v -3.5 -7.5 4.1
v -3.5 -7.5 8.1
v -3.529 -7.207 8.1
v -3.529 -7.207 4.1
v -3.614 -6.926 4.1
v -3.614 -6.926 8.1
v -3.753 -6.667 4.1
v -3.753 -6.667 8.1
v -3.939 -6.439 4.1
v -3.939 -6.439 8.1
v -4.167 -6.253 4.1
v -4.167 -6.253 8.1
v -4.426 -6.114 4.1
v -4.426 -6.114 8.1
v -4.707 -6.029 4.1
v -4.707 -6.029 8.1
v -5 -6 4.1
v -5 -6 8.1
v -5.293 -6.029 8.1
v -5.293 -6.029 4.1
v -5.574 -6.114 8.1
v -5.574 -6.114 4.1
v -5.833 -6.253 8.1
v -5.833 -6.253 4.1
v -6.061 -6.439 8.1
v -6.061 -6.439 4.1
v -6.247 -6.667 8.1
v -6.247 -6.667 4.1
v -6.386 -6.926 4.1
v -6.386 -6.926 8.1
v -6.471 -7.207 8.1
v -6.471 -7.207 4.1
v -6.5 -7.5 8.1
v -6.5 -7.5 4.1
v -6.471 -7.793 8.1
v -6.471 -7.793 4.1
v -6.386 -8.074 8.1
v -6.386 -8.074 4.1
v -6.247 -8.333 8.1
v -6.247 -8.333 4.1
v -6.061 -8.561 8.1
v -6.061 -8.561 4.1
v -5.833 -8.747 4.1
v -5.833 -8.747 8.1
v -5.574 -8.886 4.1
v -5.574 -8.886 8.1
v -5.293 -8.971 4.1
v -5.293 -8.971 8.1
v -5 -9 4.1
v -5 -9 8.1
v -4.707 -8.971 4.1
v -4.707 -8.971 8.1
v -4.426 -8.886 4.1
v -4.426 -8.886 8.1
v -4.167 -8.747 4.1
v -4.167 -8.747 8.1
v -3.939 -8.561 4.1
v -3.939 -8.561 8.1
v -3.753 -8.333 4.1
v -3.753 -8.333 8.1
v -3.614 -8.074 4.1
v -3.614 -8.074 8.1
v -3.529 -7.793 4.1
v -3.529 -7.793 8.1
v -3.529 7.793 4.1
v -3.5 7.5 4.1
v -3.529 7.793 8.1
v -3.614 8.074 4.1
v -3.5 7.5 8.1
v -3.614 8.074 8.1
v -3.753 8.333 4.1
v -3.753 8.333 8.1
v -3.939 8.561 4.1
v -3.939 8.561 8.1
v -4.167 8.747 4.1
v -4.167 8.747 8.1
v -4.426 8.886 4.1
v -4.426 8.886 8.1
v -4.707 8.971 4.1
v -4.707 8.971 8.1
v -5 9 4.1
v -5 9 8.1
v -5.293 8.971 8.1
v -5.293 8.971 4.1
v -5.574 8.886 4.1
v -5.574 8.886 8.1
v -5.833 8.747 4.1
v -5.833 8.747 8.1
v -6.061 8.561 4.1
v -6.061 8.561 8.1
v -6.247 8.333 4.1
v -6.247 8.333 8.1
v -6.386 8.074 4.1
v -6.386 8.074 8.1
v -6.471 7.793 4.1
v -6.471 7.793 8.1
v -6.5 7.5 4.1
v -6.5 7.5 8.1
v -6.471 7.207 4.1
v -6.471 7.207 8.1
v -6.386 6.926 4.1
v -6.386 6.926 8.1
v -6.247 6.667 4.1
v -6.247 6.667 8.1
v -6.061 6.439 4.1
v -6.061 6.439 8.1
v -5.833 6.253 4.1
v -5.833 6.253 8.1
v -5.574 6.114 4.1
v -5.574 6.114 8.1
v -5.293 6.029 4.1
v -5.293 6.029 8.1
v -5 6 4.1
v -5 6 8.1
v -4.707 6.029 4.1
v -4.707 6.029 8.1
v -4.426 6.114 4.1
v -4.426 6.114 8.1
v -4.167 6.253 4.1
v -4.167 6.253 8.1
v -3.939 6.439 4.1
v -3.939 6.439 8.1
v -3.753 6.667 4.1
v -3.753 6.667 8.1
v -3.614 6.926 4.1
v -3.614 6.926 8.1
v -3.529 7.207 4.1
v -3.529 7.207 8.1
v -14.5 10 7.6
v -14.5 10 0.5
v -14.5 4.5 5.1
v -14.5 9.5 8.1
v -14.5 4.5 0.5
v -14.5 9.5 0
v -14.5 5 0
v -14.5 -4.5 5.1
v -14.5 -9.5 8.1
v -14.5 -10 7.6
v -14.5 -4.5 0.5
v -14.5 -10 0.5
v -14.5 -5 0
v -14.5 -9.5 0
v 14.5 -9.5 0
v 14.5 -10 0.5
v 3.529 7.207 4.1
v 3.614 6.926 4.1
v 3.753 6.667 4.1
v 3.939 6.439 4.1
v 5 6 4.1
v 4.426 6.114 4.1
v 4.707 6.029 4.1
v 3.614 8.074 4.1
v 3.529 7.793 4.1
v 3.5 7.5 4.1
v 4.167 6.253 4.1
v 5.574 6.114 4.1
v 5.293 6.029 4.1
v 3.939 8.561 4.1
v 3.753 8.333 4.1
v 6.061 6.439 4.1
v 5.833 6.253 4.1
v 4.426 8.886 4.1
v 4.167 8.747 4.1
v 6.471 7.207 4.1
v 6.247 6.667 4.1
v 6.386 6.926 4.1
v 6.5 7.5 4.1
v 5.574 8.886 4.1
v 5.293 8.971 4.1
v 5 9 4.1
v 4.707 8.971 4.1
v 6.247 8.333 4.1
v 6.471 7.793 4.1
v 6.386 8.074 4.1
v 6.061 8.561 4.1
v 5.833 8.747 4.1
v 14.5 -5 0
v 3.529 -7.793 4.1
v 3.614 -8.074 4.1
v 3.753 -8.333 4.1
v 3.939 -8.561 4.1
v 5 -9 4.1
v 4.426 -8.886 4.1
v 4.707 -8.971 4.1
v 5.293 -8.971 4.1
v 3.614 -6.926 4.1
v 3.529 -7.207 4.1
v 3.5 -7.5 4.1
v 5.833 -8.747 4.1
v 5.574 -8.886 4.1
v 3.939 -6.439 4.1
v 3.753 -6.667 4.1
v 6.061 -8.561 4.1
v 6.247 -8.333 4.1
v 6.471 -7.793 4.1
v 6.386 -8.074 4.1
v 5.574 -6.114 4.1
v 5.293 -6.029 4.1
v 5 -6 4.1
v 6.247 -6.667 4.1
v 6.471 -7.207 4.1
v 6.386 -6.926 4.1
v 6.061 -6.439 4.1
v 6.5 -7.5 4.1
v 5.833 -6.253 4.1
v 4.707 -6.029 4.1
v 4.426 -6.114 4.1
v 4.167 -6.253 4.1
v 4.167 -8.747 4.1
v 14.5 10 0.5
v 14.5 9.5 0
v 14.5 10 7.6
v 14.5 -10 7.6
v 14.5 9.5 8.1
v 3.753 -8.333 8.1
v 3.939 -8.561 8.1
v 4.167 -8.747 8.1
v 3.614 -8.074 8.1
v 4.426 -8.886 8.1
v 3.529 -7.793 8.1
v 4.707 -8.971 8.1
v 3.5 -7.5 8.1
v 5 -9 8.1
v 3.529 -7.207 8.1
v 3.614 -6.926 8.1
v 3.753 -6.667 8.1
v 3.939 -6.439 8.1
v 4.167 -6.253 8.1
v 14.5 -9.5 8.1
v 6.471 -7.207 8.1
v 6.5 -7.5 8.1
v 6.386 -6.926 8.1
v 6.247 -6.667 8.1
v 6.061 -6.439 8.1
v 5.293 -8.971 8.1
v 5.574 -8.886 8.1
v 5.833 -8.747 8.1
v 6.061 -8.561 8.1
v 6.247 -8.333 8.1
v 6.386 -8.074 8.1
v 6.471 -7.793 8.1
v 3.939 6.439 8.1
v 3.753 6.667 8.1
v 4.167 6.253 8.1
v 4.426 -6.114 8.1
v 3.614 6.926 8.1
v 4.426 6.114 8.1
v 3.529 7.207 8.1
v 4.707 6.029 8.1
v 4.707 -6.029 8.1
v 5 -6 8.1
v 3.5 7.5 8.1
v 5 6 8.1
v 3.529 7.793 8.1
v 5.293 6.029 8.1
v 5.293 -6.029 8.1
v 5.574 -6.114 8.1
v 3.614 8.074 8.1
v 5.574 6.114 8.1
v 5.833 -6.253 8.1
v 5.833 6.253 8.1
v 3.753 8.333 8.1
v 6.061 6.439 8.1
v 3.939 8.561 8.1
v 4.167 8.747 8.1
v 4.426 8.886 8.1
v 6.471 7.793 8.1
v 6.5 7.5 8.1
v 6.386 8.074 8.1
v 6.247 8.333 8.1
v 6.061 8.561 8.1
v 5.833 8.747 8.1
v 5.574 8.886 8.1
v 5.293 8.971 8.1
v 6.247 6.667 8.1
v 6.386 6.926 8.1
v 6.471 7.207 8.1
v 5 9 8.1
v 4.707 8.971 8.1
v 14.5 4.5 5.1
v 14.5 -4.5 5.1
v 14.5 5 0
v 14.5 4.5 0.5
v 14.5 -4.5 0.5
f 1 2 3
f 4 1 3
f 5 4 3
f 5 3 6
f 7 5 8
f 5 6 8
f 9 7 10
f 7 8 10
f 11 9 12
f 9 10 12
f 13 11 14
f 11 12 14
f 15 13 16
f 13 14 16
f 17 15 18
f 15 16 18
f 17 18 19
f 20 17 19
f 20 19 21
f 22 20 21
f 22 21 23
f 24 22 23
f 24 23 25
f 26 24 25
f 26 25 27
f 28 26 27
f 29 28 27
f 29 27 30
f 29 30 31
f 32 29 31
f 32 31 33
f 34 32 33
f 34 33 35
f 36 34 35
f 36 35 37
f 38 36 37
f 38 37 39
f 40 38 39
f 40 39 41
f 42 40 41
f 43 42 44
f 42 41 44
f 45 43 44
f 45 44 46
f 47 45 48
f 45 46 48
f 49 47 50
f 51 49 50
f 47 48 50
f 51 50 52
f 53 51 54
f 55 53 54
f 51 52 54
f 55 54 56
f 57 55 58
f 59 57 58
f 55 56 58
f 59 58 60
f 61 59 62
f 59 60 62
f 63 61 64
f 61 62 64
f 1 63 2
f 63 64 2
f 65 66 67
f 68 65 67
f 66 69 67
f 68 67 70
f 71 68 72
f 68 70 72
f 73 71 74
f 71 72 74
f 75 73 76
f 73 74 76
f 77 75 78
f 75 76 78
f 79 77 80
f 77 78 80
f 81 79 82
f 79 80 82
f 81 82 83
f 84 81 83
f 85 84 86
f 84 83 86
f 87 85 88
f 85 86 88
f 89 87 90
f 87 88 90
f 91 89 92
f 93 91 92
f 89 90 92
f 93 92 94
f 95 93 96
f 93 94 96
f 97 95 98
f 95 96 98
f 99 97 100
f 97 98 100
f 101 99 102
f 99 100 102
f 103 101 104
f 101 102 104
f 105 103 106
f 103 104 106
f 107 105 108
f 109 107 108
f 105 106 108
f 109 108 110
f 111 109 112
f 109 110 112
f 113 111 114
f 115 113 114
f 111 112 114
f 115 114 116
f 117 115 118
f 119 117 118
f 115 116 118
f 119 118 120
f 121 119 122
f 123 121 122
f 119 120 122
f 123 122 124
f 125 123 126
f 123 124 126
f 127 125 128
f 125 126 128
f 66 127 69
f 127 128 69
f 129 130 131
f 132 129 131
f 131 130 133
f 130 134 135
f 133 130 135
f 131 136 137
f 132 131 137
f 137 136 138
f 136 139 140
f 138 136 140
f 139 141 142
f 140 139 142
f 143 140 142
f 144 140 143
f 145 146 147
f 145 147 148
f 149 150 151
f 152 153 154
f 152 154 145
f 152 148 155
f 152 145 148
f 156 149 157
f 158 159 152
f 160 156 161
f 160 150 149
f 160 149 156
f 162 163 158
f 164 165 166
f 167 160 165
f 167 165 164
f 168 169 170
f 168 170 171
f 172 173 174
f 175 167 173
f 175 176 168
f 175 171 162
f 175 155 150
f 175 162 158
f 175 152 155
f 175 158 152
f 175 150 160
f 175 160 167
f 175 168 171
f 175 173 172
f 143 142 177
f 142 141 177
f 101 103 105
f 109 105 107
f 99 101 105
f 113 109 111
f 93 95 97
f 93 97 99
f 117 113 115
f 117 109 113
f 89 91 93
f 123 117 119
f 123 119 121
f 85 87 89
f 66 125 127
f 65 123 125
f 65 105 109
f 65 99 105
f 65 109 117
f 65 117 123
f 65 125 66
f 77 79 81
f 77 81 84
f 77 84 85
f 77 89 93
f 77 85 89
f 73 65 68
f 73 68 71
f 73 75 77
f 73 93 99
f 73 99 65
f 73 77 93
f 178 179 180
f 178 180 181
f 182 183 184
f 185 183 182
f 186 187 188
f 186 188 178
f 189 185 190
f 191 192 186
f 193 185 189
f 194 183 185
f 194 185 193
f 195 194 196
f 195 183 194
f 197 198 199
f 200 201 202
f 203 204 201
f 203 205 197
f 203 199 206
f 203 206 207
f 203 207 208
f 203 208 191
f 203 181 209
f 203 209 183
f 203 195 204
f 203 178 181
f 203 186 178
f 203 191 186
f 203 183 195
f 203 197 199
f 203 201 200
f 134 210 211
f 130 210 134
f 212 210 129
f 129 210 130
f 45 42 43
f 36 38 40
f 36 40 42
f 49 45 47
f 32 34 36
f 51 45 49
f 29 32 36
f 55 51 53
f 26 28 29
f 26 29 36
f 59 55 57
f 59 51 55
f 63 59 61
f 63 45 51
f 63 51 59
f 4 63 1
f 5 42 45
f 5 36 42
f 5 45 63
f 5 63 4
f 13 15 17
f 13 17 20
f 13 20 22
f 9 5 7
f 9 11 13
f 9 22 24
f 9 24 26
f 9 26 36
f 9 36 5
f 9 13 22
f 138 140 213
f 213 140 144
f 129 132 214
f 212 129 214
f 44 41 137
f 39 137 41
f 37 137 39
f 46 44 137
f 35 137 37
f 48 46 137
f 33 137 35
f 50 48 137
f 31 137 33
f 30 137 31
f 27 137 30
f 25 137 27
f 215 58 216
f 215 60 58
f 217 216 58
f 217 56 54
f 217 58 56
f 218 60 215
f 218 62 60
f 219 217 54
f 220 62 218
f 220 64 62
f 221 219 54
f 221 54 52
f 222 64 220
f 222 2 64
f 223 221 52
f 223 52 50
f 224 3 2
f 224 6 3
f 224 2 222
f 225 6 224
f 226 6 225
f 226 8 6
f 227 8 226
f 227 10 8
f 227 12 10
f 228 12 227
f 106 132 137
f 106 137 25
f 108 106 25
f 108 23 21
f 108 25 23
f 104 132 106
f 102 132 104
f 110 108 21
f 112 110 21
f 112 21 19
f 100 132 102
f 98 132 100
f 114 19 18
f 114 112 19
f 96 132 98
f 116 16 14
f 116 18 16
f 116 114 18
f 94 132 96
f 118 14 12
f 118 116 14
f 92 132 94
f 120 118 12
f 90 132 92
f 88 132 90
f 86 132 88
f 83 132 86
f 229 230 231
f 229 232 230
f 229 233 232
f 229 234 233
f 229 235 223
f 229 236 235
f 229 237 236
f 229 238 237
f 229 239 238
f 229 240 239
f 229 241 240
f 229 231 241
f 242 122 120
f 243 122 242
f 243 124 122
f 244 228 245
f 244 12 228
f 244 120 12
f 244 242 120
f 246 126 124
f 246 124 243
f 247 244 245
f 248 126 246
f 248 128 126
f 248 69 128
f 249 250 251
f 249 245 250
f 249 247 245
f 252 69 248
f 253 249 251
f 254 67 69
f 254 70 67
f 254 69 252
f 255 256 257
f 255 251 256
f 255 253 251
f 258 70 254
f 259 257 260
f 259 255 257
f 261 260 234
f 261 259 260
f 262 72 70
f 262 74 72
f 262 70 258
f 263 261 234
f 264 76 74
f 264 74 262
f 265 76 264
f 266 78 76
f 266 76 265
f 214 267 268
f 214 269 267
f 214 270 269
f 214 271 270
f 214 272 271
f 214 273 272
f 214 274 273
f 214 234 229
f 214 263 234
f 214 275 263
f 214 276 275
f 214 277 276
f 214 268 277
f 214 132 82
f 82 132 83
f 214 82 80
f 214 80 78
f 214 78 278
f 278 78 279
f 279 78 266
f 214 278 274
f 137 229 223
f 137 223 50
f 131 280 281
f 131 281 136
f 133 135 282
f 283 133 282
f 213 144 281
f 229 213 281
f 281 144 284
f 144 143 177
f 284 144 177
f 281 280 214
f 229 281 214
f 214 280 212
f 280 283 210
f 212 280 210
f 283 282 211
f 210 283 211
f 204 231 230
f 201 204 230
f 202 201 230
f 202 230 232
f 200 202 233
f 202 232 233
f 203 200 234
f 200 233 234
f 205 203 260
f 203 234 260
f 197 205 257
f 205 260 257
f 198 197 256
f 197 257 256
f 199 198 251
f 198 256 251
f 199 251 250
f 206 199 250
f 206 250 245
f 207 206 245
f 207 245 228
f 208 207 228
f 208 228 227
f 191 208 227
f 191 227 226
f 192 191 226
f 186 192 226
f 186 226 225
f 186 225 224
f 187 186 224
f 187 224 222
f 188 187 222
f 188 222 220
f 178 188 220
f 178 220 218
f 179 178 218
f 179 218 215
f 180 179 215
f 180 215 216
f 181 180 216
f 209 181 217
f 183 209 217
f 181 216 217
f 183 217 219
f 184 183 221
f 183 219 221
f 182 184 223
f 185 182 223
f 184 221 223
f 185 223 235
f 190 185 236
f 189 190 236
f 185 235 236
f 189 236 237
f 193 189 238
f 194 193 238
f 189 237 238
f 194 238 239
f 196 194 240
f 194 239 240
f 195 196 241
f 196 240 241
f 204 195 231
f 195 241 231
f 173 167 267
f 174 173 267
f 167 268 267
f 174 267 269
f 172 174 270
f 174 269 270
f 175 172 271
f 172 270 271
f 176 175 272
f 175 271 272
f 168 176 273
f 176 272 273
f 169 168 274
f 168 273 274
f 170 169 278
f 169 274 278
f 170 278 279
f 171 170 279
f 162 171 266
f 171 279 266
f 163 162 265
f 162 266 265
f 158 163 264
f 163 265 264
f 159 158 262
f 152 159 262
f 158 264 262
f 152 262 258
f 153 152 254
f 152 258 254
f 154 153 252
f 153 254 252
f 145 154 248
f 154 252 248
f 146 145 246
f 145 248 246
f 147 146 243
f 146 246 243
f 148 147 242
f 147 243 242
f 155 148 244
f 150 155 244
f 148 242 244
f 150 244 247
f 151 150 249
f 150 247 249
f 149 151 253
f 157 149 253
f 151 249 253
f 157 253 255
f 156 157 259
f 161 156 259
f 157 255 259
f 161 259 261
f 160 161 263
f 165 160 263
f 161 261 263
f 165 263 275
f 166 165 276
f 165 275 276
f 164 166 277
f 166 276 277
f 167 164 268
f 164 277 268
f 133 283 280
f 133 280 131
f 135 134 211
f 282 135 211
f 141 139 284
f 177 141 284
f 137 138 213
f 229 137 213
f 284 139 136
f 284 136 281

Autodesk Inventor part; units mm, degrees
ref_plane "YZ Plane" through (0, 0, 0) normal (1, 0, 0) x (0, 1, 0)
ref_plane "XZ Plane" through (0, 0, 0) normal (0, 1, 0) x (-1, 0, 0)
ref_plane "XY Plane" through (0, 0, 0) normal (0, 0, 1) x (1, 0, 0)
sketch "スケッチ1" plane through (0, 0, 0) normal (0, 0, 1) x (1, 0, 0)
  line L0 (14.5, 10) -> (-14.5, 10)
  line L1 (-14.5, 10) -> (-14.5, -10)
  line L2 (-14.5, -10) -> (14.5, -10)
  line L3 (14.5, -10) -> (14.5, 10)
  line L4 (14.5, 10) -> (-14.5, -10) construction
  line L5 (-14.5, 10) -> (14.5, -10) construction
  point P0 (0, 0)
  dimension "d0" = 29
  dimension "d1" = 20
extrude "押し出し1" add sketch "スケッチ1" along normal blind 8.1
sketch "スケッチ2" plane through (0, 0, 8.1) normal (0, 0, 1) x (1, 0, 0)
  circle A0 centre (-5, 7.5) radius 1.5
  circle A1 centre (5, 7.5) radius 1.5
  circle A2 centre (5, -7.5) radius 1.5
  circle A3 centre (-5, -7.5) radius 1.5
  point P0 (0, 0)
  dimension "d4" = 3
  dimension "d5" = 3
  dimension "d6" = 3
  dimension "d7" = 3
extrude "押し出し2" cut sketch "スケッチ2" against normal blind 4
thread "ねじ1" size "M3x0.5" class "6H" standard "ANSI Metric M Profile" full length
thread "ねじ2" size "M3x0.5" class "6H" standard "ANSI Metric M Profile" full length
thread "ねじ3" size "M3x0.5" class "6H" standard "ANSI Metric M Profile" full length
thread "ねじ4" size "M3x0.5" class "6H" standard "ANSI Metric M Profile" full length
sketch "スケッチ3" plane through (0, 0, 0) normal (0, 0, -1) x (-1, 0, 0)
  line L0 (-14.5, -10) -> (-14.5, 10) projected
  line L1 (14.5, -4.5) -> (-14.5, -4.5)
  line L2 (-14.5, -4.5) -> (-14.5, 4.5)
  line L3 (-14.5, 4.5) -> (14.5, 4.5)
  line L4 (14.5, 4.5) -> (14.5, -4.5)
  line L5 (14.5, -4.5) -> (-14.5, 4.5) construction
  line L6 (-14.5, -4.5) -> (14.5, 4.5) construction
  point P0 (0, 0)
  dimension "d18" = 9
extrude "押し出し3" cut sketch "スケッチ3" against normal blind 5.1
chamfer "面取り1" distance 0.5 angle 45 6 edges at (0, 10, 8.1) (0, -10, 8.1) (0, -10, 0) (0, 10, 0) (0, -4.5, 0) (0, 4.5, 0)
properties part number "slider" material "ステンレス鋼"
